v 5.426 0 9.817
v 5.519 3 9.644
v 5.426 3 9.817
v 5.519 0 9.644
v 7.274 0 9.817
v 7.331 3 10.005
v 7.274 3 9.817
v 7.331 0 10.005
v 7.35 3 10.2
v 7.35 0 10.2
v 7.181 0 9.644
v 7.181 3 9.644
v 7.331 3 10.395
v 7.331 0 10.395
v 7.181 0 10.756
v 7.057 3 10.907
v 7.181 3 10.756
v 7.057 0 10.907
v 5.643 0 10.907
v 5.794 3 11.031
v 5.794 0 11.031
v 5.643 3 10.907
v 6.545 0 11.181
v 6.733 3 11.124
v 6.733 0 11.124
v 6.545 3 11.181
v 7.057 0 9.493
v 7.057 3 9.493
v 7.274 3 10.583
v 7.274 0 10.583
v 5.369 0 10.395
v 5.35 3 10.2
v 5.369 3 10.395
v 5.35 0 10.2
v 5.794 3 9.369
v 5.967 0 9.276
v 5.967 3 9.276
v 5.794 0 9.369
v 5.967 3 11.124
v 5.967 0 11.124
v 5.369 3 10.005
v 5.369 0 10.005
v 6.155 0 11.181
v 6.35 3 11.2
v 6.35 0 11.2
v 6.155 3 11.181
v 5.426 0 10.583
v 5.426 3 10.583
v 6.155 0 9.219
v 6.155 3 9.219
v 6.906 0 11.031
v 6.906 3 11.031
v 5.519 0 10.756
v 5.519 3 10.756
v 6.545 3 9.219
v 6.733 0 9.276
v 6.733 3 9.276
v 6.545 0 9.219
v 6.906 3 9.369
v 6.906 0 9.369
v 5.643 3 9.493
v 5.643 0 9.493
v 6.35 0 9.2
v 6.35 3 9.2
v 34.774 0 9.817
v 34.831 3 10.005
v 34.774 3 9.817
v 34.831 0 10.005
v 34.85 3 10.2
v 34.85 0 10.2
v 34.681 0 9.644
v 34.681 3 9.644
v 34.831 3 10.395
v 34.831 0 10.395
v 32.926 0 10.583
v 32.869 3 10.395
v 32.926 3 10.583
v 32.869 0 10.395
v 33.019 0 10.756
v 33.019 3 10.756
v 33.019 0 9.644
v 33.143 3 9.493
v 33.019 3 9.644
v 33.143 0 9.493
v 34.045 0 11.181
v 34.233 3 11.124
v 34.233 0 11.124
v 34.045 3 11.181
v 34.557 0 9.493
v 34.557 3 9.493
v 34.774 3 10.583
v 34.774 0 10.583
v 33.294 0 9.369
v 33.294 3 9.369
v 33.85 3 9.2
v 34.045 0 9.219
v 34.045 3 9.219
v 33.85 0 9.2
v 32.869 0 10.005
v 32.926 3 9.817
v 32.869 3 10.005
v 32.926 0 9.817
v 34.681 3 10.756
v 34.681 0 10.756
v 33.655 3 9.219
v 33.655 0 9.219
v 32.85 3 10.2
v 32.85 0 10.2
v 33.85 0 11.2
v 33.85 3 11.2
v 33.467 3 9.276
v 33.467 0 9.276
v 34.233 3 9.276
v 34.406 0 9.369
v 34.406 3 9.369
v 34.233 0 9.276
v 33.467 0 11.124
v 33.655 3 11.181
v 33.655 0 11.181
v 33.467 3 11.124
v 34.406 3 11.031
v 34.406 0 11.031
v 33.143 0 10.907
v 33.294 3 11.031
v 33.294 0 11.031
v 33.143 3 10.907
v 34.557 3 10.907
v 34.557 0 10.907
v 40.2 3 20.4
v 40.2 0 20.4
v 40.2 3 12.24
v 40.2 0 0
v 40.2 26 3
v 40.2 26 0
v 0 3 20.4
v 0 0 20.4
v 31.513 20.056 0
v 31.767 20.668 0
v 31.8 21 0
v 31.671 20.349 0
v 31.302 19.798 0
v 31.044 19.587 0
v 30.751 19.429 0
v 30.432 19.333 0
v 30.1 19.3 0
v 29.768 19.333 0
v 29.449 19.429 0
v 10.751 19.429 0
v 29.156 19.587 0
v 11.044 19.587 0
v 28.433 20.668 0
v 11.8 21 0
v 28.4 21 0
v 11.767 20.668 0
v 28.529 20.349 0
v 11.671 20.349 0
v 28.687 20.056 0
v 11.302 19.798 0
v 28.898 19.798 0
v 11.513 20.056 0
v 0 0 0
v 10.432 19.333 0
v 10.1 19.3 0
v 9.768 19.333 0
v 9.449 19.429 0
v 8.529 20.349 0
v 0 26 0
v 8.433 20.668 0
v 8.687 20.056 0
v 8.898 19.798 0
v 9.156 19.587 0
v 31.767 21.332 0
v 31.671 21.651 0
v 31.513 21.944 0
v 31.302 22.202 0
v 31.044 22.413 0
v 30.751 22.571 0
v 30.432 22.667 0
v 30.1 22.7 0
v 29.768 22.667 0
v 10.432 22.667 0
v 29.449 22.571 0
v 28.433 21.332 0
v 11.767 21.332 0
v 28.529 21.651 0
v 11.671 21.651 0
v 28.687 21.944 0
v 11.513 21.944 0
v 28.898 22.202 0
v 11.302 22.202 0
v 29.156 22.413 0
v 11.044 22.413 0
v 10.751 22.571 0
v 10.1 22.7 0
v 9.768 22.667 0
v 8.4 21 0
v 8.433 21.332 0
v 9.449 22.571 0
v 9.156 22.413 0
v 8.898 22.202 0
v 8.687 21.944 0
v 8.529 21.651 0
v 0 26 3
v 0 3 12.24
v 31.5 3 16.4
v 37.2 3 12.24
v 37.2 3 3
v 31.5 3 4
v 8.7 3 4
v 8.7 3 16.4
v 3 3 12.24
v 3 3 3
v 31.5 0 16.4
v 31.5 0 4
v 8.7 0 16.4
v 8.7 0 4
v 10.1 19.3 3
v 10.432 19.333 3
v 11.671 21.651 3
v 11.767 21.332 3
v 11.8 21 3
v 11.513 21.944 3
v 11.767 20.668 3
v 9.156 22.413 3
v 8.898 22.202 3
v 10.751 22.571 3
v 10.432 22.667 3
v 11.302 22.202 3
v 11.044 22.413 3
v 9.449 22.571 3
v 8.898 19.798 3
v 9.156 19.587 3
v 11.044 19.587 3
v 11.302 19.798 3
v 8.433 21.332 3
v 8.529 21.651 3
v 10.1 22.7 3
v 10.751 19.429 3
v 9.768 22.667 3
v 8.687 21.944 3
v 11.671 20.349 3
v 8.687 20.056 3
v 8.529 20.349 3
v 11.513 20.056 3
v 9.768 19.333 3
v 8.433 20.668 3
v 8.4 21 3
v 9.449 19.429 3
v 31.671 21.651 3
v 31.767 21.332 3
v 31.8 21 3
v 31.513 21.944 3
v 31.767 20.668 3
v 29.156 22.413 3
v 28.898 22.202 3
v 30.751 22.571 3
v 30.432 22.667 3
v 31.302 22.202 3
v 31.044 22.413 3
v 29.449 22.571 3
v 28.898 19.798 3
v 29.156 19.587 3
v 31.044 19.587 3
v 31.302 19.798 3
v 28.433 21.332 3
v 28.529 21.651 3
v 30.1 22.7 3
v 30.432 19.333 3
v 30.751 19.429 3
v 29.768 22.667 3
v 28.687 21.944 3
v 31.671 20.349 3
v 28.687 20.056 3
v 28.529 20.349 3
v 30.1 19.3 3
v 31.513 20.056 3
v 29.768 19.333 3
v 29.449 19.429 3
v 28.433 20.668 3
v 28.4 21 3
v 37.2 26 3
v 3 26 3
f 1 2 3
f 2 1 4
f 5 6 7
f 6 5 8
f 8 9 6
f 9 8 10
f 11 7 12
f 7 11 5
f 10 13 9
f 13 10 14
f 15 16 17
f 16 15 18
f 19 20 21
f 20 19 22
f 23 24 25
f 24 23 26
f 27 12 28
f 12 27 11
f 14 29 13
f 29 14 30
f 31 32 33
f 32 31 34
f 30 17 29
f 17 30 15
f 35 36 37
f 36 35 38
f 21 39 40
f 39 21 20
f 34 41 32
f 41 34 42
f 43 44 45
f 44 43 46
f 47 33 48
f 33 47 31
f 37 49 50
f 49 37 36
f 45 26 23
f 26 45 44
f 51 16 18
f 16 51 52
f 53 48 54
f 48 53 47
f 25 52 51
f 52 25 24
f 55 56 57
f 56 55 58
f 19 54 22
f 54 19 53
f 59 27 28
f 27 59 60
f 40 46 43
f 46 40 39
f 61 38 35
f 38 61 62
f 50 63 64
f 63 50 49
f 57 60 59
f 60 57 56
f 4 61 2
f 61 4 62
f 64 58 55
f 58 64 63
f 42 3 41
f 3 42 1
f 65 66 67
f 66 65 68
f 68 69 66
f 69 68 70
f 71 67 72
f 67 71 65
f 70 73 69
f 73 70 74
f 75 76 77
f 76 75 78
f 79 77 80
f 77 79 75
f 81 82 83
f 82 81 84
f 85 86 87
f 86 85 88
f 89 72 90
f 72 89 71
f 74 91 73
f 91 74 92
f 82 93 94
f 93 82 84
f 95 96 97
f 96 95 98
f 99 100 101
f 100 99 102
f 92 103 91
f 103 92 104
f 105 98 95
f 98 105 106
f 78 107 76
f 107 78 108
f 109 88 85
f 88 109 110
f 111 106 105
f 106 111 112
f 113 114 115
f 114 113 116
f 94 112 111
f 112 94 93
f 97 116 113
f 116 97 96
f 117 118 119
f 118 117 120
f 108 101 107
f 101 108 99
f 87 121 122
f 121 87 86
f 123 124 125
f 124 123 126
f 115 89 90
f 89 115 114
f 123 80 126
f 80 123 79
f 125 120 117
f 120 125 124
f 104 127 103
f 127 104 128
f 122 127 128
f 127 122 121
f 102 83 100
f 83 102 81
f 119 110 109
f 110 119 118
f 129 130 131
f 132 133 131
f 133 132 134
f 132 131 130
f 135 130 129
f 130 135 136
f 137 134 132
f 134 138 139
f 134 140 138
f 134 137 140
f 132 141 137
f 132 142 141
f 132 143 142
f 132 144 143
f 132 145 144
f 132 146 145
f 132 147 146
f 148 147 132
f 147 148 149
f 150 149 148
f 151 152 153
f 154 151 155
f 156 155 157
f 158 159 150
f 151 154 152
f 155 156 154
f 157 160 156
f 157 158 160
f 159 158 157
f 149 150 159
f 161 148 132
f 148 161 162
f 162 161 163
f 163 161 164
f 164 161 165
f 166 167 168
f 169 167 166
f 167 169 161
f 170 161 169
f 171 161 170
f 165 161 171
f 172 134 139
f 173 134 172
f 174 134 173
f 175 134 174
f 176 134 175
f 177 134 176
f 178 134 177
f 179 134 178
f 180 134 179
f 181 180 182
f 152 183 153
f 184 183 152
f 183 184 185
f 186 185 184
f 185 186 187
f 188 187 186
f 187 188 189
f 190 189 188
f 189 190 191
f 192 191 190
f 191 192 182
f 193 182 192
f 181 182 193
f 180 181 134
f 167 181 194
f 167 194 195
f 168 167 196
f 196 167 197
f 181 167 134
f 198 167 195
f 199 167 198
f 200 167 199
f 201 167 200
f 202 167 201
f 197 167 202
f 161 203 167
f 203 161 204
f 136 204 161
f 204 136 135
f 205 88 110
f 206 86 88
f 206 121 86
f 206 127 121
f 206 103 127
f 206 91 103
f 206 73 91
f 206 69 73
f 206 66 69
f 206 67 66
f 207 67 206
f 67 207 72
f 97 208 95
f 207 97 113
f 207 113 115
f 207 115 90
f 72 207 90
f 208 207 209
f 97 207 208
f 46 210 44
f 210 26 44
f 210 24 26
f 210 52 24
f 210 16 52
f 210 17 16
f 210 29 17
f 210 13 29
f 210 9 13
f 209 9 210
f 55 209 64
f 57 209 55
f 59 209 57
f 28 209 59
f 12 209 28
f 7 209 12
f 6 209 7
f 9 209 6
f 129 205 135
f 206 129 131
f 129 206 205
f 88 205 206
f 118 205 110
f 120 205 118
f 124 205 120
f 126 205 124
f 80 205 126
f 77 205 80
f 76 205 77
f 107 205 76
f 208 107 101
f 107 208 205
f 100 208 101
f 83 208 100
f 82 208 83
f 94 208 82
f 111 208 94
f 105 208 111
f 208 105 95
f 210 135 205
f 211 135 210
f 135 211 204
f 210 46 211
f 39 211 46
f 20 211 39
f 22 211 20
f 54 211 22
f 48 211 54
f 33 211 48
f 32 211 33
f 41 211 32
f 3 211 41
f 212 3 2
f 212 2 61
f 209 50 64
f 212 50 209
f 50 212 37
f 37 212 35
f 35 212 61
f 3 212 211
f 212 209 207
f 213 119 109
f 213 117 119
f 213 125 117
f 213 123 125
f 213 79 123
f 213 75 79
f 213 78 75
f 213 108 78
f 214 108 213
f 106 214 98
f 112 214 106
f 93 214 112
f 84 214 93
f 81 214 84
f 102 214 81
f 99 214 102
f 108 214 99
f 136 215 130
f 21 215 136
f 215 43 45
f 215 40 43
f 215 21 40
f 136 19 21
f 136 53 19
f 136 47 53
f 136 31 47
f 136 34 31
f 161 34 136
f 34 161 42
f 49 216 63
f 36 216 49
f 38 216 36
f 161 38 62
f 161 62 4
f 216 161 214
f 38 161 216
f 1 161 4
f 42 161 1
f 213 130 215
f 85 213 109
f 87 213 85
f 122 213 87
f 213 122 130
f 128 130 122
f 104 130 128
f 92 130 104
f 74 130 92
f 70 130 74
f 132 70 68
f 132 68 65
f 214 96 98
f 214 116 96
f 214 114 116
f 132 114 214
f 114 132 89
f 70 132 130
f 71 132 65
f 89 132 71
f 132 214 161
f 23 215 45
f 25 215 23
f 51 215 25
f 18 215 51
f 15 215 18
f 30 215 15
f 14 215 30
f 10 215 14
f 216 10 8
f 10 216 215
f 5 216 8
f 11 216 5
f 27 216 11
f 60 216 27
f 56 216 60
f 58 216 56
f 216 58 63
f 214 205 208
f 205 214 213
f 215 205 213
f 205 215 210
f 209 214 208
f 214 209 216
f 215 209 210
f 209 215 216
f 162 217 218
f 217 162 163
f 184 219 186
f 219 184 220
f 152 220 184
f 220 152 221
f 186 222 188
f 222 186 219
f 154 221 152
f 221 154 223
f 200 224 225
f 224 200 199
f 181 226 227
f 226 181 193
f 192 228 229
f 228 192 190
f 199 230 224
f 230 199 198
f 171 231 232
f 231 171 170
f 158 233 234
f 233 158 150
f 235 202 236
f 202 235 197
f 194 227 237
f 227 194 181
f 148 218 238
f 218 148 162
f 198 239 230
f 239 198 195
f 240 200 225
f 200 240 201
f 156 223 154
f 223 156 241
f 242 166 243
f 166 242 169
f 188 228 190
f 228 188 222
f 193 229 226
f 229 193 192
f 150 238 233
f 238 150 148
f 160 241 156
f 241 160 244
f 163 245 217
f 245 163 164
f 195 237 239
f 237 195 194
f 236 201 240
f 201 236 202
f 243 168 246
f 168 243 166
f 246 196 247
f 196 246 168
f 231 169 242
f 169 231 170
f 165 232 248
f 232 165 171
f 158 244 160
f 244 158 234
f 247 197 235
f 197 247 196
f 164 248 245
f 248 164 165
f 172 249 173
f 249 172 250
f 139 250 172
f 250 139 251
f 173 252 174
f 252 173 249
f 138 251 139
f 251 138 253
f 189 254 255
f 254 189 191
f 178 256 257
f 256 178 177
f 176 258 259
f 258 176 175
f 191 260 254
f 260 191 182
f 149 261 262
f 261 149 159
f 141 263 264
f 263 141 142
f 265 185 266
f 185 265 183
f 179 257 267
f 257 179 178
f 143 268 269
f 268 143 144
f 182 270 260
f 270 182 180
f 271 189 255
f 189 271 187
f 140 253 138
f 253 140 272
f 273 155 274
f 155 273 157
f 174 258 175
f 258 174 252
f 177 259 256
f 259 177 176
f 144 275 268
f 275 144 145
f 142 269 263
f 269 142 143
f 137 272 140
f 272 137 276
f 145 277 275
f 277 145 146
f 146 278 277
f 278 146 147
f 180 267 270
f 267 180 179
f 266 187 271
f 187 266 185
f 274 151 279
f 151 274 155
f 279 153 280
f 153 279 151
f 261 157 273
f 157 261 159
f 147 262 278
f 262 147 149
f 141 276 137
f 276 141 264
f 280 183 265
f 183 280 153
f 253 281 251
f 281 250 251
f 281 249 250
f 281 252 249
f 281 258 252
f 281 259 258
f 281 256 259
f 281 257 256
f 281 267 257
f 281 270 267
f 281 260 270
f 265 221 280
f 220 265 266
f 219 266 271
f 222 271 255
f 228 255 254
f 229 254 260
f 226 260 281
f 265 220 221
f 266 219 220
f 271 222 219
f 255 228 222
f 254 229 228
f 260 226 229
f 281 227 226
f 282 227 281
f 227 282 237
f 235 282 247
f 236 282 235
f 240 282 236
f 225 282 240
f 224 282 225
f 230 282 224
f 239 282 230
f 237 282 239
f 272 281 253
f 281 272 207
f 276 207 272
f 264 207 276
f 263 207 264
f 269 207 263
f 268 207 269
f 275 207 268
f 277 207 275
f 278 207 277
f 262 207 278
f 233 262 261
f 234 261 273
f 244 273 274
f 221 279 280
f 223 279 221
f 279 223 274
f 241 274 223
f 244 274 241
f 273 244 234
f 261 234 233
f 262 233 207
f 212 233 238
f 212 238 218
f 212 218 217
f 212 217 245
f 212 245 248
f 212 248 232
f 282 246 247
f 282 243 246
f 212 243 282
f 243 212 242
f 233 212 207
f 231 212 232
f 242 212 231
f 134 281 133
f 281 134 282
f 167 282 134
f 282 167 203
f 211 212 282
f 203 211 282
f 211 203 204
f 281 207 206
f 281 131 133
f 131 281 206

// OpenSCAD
// servo_bracket.scad: a parametric L-bracket for an SG90-class micro servo.
// Every size is a named parameter. Measure YOUR servo with calipers and change
// the numbers at the top; never trust one datasheet drawing.
//   Render:  openscad -o servo_bracket.stl servo_bracket.scad
//   Change one value from the command line:  openscad -D clearance=0.4 -o b.stl servo_bracket.scad

// --- the servo (common SG90 drawing: body 22.2 x 11.8 mm, 32.2 mm across the tabs) ---
servo_l      = 22.2;   // body length, mm
servo_w      = 11.8;   // body width, mm
tab_span     = 32.2;   // length across both mounting tabs, mm
hole_pitch   = 27.5;   // tab screw spacing: not on that drawing; sources say 27-28, measure it
hole_d       = 2.0;    // tab hole for an M2 / self-tapping screw, mm

// --- the printer and the bracket ---
clearance    = 0.3;    // gap on each side of the body (from your tolerance gauge, Lesson 2)
wall         = 3.0;    // plate thickness, mm
margin       = 4.0;    // material left around the cut-out, mm
base_depth   = 26.0;   // how far the foot sticks out, mm (servo body hangs ~16 mm behind the plate)
mount_d      = 3.4;    // foot holes for M3 screws (3 mm + clearance), mm

// --- derived sizes: computed, never typed in twice ---
cut_l   = servo_l + 2 * clearance;
cut_w   = servo_w + 2 * clearance;
plate_l = tab_span + 2 * margin;
plate_h = cut_w + 2 * margin;

echo("cut-out (mm)", cut_l, "x", cut_w);
echo("plate (mm)", plate_l, "x", plate_h, "x", wall);
echo("screw pitch (mm)", hole_pitch, "tab overhang each side (mm)", (tab_span - servo_l) / 2);
assert(hole_pitch > cut_l + hole_d, "screw holes would cut into the body opening");
assert(hole_pitch < tab_span - hole_d, "screw holes would fall off the tabs");

$fn = 32;

module plate() {                       // upright plate that the servo tabs screw onto
  difference() {
    cube([plate_l, wall, plate_h]);
    translate([(plate_l - cut_l) / 2, -1, margin])
      cube([cut_l, wall + 2, cut_w]);
    for (s = [-1, 1])
      translate([plate_l / 2 + s * hole_pitch / 2, -1, plate_h / 2])
        rotate([-90, 0, 0]) cylinder(d = hole_d, h = wall + 2);
  }
}

module foot() {                        // horizontal foot that bolts to the robot
  difference() {
    cube([plate_l, base_depth, wall]);
    for (s = [-1, 1])
      translate([plate_l / 2 + s * 10, base_depth - 5, -1])   // in front of the servo body
        cylinder(d = mount_d, h = wall + 2);
  }
}

module gusset() {                      // triangular rib: stops the plate flexing
  rotate([90, 0, 90]) linear_extrude(wall)
    polygon([[wall, wall], [base_depth, wall], [wall, plate_h * 0.6]]);
}

plate();
foot();
gusset();
translate([plate_l - wall, 0, 0]) gusset();
